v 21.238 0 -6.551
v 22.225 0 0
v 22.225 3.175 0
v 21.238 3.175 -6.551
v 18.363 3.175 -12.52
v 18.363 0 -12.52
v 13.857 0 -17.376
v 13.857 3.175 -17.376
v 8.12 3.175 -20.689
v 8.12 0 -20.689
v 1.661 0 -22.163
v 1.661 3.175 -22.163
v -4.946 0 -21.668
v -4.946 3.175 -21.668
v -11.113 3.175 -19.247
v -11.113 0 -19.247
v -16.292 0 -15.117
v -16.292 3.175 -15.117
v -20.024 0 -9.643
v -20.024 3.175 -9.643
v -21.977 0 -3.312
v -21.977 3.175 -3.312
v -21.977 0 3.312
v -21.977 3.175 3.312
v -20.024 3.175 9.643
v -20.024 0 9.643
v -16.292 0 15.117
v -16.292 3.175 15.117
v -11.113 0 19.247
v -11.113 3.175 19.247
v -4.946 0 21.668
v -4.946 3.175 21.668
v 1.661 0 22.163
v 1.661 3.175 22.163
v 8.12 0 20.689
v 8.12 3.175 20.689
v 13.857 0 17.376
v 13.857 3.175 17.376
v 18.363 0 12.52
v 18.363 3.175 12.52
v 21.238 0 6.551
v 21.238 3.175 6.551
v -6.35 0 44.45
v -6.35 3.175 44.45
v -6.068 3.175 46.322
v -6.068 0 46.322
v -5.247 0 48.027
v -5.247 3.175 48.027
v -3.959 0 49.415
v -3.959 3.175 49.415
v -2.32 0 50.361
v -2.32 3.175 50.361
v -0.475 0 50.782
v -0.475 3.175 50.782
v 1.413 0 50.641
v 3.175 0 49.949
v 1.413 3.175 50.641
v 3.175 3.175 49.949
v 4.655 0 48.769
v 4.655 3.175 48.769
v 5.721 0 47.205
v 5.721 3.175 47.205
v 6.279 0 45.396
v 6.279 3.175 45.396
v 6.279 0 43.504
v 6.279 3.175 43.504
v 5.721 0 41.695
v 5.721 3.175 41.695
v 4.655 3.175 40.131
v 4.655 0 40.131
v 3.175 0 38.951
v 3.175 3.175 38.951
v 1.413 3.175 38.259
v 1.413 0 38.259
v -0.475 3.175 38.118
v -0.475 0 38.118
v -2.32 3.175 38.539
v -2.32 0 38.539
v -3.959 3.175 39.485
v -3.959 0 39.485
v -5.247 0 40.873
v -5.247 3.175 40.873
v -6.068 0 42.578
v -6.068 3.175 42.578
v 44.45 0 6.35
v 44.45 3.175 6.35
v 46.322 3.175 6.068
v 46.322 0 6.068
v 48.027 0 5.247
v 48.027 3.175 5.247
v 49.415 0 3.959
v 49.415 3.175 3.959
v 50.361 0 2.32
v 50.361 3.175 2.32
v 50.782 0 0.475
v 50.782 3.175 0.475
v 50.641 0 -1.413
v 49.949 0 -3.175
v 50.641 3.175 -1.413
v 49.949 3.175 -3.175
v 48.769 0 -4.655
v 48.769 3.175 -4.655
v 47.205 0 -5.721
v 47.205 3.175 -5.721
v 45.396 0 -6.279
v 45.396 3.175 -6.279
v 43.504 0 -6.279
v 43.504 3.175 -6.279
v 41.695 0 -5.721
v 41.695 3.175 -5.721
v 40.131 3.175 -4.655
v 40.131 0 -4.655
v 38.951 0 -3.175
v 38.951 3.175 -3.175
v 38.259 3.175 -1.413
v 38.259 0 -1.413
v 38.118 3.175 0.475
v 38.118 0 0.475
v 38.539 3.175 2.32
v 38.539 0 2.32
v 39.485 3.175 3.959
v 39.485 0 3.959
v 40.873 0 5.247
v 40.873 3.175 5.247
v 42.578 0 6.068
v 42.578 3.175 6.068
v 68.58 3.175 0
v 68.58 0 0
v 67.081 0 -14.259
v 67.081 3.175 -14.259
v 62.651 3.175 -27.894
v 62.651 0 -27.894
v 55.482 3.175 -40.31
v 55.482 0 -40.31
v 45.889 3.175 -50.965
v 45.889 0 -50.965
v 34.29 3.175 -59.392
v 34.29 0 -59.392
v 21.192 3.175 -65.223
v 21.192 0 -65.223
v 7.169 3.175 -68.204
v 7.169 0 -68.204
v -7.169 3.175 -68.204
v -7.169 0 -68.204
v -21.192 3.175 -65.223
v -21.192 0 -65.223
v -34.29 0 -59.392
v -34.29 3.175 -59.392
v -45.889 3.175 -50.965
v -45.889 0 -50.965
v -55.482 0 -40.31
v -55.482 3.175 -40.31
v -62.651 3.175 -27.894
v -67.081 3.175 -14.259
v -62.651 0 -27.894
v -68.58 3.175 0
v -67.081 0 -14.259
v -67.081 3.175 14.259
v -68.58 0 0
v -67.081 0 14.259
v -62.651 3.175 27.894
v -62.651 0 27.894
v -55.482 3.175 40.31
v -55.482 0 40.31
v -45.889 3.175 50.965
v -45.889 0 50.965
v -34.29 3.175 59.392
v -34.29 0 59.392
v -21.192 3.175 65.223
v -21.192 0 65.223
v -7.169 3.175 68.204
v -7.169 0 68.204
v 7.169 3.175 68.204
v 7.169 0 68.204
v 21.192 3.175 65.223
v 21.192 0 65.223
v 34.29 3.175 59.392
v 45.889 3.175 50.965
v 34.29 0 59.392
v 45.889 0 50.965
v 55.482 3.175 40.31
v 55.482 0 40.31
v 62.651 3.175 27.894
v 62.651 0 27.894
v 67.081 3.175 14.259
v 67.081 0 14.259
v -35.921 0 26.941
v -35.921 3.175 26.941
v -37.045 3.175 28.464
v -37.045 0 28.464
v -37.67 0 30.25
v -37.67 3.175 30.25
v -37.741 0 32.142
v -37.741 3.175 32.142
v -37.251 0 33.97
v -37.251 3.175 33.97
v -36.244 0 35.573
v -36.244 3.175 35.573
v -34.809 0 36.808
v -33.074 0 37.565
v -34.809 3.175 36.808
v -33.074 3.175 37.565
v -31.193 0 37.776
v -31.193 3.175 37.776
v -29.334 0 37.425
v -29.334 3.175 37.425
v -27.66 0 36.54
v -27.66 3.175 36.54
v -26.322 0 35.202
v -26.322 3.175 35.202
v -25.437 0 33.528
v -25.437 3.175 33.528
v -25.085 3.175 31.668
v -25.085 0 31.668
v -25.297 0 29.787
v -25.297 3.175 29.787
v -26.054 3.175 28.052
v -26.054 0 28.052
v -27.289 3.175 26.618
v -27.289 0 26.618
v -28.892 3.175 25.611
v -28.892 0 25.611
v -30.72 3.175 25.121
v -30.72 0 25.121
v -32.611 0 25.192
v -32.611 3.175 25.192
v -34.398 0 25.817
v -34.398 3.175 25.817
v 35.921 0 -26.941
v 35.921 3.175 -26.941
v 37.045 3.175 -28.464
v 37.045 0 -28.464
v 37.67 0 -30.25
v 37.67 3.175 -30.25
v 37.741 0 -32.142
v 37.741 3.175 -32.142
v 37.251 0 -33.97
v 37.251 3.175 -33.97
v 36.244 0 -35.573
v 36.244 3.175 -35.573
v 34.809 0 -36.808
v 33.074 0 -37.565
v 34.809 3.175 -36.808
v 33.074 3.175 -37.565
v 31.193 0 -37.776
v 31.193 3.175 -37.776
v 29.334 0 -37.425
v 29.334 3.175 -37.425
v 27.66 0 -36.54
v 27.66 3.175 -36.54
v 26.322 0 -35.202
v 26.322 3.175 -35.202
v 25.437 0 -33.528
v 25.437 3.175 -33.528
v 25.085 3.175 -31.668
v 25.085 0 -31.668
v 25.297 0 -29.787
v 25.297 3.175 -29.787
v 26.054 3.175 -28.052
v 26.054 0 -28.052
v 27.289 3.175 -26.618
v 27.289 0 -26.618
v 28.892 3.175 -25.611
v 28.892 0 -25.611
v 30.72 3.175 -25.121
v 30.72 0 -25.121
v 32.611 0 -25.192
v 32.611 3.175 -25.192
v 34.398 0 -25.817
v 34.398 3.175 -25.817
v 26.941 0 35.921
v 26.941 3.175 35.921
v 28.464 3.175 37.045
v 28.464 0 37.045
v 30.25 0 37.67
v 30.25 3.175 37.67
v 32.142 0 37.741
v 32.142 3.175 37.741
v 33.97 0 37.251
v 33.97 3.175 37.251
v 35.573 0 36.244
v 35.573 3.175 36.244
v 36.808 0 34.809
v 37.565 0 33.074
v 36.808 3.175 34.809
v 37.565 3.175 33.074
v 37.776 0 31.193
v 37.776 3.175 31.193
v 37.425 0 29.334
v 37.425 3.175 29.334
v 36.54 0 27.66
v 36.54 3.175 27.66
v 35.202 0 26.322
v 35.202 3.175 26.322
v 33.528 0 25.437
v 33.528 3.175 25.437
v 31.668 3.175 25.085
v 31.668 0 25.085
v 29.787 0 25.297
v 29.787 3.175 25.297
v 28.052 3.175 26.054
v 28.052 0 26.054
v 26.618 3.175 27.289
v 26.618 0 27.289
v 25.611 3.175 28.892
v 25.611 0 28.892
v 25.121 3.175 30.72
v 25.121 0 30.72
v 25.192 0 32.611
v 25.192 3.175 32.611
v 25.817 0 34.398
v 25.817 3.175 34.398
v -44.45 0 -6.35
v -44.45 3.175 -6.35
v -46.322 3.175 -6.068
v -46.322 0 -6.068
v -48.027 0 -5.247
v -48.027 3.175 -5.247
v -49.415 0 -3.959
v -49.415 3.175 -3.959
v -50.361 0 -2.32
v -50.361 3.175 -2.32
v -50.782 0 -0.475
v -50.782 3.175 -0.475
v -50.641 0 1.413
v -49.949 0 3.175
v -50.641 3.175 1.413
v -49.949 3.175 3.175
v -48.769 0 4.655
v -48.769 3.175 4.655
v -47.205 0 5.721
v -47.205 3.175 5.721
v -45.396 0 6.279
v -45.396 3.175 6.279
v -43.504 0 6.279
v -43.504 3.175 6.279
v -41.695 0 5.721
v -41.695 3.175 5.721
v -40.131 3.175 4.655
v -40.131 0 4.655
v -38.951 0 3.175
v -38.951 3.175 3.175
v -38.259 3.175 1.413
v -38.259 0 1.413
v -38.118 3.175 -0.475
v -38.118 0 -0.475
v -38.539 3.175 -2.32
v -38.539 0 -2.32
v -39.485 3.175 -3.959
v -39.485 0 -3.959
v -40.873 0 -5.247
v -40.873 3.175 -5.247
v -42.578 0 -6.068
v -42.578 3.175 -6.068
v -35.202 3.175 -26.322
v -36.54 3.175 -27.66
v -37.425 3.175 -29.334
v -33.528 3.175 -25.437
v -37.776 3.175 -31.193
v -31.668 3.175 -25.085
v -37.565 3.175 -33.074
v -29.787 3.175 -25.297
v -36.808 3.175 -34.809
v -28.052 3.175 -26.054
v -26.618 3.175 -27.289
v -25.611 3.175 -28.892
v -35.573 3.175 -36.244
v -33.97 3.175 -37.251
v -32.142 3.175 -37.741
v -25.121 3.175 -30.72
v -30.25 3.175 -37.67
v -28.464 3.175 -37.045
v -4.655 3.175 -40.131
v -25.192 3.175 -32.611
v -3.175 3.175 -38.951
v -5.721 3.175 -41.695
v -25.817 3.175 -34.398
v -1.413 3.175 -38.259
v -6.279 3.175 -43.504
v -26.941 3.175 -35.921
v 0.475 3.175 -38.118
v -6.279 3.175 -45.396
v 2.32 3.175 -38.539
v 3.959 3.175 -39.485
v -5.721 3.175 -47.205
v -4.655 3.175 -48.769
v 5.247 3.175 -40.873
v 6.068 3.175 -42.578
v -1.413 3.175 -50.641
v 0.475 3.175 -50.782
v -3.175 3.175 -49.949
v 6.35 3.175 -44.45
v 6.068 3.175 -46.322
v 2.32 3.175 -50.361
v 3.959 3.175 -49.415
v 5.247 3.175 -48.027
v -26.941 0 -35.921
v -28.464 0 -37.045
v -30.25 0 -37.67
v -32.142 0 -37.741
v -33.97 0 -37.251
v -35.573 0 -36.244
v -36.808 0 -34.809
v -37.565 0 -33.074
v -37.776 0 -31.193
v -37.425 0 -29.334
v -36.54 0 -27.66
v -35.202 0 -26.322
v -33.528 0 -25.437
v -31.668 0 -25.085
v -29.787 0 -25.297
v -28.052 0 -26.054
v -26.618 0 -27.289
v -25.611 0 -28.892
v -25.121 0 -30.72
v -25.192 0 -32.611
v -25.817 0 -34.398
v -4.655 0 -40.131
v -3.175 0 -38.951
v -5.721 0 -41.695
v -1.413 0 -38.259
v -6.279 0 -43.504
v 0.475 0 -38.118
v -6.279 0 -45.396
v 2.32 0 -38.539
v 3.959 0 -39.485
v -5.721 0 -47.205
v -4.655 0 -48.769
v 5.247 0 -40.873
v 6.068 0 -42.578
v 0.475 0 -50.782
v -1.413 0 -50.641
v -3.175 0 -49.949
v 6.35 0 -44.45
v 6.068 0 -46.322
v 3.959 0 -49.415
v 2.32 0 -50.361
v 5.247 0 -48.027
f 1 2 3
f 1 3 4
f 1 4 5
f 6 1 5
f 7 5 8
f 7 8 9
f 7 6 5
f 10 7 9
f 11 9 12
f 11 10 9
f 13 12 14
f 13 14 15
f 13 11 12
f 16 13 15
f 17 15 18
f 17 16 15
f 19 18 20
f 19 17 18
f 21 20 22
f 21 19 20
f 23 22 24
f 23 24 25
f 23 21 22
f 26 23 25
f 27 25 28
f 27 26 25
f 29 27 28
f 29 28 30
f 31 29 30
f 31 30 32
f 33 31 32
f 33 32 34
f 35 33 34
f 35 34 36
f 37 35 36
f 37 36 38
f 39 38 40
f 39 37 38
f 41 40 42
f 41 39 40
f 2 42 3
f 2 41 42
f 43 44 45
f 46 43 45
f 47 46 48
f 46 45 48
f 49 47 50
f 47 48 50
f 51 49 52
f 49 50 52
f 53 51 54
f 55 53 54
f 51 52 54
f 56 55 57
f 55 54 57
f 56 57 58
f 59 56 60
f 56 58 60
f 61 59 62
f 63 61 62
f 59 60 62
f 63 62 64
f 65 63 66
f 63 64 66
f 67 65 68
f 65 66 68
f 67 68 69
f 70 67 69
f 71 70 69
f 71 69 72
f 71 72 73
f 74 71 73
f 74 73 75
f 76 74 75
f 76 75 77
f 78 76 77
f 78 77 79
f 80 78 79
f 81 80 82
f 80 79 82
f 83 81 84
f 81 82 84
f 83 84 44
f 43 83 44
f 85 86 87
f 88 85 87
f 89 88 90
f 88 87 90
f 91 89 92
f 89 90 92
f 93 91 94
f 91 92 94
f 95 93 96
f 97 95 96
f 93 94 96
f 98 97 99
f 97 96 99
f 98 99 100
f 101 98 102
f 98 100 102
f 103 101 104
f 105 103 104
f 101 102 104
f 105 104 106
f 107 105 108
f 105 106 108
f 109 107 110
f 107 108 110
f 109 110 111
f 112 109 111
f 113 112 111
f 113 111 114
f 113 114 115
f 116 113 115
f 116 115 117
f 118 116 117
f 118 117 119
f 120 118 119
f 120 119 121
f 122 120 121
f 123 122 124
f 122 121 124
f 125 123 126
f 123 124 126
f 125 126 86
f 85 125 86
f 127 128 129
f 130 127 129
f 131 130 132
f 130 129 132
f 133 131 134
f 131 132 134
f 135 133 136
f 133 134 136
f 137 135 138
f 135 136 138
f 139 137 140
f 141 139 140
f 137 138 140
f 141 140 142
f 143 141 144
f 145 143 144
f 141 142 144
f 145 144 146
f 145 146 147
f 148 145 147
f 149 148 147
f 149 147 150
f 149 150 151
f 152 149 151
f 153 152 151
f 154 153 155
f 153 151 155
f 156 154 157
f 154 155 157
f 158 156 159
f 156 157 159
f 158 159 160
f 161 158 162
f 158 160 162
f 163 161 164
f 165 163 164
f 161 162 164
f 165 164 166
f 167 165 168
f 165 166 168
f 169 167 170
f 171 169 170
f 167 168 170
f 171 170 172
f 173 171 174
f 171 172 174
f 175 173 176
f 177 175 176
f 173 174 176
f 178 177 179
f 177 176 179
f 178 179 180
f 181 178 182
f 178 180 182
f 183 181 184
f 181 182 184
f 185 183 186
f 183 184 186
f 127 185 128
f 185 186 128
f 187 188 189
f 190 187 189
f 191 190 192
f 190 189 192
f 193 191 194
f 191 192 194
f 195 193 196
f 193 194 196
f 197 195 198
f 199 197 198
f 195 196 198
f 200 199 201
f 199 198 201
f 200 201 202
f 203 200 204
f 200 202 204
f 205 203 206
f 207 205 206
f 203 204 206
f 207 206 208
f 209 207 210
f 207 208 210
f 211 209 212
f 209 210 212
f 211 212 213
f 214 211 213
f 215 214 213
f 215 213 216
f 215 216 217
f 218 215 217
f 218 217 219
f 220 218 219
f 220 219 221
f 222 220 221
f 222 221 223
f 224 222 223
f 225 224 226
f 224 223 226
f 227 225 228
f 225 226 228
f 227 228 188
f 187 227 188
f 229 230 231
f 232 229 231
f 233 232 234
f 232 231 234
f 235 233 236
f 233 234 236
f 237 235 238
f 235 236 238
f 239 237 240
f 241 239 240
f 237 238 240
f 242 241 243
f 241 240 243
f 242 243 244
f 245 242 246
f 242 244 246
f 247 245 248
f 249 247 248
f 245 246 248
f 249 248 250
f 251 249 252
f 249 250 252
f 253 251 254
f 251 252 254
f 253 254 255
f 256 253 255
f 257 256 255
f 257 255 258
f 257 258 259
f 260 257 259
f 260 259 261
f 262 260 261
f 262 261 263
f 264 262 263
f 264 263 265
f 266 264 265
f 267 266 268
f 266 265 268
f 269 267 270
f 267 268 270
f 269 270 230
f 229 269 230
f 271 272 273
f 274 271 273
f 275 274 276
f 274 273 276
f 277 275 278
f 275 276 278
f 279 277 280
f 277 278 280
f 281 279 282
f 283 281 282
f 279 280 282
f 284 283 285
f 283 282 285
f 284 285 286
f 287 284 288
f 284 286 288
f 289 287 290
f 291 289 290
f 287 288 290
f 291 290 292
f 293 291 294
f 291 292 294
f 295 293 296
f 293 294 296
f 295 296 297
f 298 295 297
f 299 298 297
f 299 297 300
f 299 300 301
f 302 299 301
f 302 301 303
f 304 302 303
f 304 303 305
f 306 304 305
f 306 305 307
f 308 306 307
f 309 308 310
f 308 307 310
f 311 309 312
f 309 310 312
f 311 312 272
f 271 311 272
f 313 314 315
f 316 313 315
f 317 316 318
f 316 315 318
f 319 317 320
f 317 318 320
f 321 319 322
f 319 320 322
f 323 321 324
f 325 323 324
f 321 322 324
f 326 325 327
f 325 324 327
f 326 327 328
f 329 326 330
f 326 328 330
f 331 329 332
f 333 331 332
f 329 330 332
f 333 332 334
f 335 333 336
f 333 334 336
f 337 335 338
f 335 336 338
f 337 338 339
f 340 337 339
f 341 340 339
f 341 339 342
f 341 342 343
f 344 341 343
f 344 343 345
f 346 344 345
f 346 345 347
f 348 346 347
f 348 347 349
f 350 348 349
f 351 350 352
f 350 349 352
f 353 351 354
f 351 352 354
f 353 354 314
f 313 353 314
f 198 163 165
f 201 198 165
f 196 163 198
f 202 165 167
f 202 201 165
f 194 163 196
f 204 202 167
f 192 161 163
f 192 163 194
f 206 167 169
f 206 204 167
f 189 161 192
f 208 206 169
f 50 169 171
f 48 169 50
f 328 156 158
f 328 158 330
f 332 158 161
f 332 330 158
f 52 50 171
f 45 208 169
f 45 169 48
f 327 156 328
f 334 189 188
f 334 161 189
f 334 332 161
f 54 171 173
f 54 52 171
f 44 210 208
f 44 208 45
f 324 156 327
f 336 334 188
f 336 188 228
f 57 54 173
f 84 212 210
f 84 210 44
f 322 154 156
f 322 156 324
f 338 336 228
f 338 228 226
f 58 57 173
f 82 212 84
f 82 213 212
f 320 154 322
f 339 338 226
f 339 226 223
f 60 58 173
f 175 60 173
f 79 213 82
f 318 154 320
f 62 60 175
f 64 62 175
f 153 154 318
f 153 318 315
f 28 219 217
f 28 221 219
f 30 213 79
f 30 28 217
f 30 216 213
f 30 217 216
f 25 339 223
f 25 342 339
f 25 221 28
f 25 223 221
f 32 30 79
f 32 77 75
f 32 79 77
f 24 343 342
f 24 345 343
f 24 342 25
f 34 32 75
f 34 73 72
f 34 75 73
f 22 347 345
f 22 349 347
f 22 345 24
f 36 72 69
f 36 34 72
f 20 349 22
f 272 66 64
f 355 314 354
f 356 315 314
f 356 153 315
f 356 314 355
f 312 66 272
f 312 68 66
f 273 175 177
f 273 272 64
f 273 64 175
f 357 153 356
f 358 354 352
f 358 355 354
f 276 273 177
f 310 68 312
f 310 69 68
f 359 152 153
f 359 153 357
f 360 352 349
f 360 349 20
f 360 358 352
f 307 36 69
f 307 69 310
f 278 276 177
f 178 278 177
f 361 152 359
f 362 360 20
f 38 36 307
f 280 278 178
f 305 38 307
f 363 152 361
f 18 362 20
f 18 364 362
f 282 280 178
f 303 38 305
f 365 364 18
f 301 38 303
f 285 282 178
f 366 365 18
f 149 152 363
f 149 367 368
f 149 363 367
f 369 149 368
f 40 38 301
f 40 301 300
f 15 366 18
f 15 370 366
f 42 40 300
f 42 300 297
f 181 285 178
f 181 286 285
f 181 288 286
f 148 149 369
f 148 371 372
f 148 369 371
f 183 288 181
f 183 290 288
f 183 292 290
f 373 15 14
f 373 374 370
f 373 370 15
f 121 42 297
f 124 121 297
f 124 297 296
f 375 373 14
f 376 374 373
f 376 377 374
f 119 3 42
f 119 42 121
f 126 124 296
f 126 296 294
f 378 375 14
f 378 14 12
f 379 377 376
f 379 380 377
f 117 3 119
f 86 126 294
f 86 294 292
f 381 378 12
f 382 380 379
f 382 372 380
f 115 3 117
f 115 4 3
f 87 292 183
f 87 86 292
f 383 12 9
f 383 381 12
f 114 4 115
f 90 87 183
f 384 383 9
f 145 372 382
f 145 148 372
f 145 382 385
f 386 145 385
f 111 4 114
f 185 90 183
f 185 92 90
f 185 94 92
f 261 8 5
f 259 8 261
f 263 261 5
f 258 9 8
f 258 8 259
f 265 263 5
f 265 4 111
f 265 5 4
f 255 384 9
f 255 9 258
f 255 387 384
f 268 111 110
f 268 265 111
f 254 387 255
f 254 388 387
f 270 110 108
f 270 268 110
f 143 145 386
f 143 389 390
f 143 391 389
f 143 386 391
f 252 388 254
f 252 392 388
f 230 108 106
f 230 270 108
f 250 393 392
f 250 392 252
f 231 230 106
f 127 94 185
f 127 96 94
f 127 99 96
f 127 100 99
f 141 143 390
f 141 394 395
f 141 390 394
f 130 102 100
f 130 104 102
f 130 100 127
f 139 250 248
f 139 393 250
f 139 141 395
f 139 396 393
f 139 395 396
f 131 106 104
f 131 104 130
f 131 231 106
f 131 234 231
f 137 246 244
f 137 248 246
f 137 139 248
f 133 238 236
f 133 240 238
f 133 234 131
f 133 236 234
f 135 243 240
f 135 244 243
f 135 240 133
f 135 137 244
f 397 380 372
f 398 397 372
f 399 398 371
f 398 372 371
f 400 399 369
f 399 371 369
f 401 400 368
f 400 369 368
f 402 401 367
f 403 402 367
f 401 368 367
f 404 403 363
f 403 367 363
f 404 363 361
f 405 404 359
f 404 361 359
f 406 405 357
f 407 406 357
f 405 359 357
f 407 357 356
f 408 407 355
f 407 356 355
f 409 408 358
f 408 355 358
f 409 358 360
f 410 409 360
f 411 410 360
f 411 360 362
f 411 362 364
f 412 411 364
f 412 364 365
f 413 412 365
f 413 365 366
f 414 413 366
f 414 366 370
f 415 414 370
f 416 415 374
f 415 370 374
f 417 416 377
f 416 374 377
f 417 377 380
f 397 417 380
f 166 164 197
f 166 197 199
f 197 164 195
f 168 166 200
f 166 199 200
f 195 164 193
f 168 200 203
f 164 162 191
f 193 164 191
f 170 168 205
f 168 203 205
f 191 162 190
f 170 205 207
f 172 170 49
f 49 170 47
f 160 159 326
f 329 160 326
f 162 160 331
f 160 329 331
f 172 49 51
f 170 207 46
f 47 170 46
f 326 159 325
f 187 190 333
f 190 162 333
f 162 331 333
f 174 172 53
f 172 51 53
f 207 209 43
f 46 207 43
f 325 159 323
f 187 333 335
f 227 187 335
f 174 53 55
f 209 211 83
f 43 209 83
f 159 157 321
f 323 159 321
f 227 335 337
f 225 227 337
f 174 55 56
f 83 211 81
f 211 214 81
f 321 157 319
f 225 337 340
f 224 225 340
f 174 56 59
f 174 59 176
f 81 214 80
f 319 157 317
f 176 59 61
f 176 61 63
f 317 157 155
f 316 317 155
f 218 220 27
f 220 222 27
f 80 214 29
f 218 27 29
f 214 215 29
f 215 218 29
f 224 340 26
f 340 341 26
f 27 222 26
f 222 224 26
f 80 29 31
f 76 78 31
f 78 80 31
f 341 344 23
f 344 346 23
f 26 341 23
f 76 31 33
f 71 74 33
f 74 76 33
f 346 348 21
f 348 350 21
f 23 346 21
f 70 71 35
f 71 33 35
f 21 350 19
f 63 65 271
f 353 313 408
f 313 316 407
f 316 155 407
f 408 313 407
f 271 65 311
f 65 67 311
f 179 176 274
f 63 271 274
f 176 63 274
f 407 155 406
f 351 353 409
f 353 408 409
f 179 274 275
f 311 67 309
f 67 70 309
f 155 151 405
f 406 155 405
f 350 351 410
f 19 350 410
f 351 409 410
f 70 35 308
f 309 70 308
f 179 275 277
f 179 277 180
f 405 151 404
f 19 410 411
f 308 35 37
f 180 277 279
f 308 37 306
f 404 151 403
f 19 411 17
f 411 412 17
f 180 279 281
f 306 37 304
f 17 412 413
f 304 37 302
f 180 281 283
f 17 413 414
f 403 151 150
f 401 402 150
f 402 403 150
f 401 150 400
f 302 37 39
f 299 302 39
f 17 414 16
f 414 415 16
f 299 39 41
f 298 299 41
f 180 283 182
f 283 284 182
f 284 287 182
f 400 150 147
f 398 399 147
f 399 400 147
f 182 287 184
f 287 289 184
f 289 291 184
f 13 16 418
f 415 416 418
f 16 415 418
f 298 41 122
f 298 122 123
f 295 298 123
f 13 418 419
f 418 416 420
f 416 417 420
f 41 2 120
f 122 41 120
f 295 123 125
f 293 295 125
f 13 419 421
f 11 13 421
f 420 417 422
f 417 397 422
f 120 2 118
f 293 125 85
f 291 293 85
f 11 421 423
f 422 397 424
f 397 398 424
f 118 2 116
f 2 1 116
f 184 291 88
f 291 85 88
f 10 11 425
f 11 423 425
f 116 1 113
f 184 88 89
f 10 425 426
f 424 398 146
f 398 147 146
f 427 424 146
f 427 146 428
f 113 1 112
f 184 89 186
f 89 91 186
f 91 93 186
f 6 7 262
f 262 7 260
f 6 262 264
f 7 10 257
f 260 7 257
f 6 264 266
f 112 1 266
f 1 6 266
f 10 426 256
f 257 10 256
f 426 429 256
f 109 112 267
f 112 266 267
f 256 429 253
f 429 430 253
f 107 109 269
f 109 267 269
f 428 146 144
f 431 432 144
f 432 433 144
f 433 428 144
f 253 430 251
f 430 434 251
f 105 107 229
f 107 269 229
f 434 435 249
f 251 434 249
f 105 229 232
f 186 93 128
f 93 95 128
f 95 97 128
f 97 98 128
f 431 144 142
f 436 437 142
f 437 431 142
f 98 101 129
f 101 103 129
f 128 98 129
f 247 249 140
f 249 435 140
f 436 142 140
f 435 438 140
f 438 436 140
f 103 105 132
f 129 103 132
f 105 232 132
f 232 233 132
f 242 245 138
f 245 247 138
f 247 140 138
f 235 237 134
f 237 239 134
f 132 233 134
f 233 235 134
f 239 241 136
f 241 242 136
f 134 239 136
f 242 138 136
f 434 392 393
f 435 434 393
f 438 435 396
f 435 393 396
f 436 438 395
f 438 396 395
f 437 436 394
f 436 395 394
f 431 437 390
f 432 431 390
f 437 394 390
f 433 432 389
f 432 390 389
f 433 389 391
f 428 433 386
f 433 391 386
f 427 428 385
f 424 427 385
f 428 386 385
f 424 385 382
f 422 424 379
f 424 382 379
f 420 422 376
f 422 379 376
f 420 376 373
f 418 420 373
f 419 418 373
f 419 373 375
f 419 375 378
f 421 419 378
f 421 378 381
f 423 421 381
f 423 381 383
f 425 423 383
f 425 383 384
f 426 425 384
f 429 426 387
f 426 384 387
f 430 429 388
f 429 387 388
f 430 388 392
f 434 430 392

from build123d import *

# Parameters (mm, degrees)
SKETCH1_R           = 68.58
SKETCH1_R_2         = 22.225
BOSS_EXTRUDE1_DEPTH = 3.175
SKETCH2_R           = 6.35
CUT_EXTRUDE1_DEPTH  = 3.175
CIRPATTERN1_COUNT   = 8


with BuildPart() as part:
    # Sketch1 → Boss-Extrude1 (new body)
    with BuildSketch(Plane(origin=(0, 0, 0), x_dir=(1, 0, 0), z_dir=(0, 1, 0))):
        Circle(SKETCH1_R)
        Circle(SKETCH1_R_2, mode=Mode.SUBTRACT)
    extrude(amount=BOSS_EXTRUDE1_DEPTH)

    # Sketch2 → Cut-Extrude1 (cut)
    with BuildSketch(Plane(origin=(0, 3.175, 0), x_dir=(1, 0, 0), z_dir=(0, 1, 0))):
        with Locations((0, 44.45)):
            Circle(SKETCH2_R)
    cut_extrude1 = extrude(amount=-CUT_EXTRUDE1_DEPTH, mode=Mode.SUBTRACT)

    # CirPattern1: Cut-Extrude1 ×8 about axis
    cirpattern1_axis = Axis((0, 0, 0), (0, 1, 0))
    for i in range(1, CIRPATTERN1_COUNT):
        add(cut_extrude1.rotate(cirpattern1_axis, i * 360 / CIRPATTERN1_COUNT), mode=Mode.SUBTRACT)


solid = part.part
